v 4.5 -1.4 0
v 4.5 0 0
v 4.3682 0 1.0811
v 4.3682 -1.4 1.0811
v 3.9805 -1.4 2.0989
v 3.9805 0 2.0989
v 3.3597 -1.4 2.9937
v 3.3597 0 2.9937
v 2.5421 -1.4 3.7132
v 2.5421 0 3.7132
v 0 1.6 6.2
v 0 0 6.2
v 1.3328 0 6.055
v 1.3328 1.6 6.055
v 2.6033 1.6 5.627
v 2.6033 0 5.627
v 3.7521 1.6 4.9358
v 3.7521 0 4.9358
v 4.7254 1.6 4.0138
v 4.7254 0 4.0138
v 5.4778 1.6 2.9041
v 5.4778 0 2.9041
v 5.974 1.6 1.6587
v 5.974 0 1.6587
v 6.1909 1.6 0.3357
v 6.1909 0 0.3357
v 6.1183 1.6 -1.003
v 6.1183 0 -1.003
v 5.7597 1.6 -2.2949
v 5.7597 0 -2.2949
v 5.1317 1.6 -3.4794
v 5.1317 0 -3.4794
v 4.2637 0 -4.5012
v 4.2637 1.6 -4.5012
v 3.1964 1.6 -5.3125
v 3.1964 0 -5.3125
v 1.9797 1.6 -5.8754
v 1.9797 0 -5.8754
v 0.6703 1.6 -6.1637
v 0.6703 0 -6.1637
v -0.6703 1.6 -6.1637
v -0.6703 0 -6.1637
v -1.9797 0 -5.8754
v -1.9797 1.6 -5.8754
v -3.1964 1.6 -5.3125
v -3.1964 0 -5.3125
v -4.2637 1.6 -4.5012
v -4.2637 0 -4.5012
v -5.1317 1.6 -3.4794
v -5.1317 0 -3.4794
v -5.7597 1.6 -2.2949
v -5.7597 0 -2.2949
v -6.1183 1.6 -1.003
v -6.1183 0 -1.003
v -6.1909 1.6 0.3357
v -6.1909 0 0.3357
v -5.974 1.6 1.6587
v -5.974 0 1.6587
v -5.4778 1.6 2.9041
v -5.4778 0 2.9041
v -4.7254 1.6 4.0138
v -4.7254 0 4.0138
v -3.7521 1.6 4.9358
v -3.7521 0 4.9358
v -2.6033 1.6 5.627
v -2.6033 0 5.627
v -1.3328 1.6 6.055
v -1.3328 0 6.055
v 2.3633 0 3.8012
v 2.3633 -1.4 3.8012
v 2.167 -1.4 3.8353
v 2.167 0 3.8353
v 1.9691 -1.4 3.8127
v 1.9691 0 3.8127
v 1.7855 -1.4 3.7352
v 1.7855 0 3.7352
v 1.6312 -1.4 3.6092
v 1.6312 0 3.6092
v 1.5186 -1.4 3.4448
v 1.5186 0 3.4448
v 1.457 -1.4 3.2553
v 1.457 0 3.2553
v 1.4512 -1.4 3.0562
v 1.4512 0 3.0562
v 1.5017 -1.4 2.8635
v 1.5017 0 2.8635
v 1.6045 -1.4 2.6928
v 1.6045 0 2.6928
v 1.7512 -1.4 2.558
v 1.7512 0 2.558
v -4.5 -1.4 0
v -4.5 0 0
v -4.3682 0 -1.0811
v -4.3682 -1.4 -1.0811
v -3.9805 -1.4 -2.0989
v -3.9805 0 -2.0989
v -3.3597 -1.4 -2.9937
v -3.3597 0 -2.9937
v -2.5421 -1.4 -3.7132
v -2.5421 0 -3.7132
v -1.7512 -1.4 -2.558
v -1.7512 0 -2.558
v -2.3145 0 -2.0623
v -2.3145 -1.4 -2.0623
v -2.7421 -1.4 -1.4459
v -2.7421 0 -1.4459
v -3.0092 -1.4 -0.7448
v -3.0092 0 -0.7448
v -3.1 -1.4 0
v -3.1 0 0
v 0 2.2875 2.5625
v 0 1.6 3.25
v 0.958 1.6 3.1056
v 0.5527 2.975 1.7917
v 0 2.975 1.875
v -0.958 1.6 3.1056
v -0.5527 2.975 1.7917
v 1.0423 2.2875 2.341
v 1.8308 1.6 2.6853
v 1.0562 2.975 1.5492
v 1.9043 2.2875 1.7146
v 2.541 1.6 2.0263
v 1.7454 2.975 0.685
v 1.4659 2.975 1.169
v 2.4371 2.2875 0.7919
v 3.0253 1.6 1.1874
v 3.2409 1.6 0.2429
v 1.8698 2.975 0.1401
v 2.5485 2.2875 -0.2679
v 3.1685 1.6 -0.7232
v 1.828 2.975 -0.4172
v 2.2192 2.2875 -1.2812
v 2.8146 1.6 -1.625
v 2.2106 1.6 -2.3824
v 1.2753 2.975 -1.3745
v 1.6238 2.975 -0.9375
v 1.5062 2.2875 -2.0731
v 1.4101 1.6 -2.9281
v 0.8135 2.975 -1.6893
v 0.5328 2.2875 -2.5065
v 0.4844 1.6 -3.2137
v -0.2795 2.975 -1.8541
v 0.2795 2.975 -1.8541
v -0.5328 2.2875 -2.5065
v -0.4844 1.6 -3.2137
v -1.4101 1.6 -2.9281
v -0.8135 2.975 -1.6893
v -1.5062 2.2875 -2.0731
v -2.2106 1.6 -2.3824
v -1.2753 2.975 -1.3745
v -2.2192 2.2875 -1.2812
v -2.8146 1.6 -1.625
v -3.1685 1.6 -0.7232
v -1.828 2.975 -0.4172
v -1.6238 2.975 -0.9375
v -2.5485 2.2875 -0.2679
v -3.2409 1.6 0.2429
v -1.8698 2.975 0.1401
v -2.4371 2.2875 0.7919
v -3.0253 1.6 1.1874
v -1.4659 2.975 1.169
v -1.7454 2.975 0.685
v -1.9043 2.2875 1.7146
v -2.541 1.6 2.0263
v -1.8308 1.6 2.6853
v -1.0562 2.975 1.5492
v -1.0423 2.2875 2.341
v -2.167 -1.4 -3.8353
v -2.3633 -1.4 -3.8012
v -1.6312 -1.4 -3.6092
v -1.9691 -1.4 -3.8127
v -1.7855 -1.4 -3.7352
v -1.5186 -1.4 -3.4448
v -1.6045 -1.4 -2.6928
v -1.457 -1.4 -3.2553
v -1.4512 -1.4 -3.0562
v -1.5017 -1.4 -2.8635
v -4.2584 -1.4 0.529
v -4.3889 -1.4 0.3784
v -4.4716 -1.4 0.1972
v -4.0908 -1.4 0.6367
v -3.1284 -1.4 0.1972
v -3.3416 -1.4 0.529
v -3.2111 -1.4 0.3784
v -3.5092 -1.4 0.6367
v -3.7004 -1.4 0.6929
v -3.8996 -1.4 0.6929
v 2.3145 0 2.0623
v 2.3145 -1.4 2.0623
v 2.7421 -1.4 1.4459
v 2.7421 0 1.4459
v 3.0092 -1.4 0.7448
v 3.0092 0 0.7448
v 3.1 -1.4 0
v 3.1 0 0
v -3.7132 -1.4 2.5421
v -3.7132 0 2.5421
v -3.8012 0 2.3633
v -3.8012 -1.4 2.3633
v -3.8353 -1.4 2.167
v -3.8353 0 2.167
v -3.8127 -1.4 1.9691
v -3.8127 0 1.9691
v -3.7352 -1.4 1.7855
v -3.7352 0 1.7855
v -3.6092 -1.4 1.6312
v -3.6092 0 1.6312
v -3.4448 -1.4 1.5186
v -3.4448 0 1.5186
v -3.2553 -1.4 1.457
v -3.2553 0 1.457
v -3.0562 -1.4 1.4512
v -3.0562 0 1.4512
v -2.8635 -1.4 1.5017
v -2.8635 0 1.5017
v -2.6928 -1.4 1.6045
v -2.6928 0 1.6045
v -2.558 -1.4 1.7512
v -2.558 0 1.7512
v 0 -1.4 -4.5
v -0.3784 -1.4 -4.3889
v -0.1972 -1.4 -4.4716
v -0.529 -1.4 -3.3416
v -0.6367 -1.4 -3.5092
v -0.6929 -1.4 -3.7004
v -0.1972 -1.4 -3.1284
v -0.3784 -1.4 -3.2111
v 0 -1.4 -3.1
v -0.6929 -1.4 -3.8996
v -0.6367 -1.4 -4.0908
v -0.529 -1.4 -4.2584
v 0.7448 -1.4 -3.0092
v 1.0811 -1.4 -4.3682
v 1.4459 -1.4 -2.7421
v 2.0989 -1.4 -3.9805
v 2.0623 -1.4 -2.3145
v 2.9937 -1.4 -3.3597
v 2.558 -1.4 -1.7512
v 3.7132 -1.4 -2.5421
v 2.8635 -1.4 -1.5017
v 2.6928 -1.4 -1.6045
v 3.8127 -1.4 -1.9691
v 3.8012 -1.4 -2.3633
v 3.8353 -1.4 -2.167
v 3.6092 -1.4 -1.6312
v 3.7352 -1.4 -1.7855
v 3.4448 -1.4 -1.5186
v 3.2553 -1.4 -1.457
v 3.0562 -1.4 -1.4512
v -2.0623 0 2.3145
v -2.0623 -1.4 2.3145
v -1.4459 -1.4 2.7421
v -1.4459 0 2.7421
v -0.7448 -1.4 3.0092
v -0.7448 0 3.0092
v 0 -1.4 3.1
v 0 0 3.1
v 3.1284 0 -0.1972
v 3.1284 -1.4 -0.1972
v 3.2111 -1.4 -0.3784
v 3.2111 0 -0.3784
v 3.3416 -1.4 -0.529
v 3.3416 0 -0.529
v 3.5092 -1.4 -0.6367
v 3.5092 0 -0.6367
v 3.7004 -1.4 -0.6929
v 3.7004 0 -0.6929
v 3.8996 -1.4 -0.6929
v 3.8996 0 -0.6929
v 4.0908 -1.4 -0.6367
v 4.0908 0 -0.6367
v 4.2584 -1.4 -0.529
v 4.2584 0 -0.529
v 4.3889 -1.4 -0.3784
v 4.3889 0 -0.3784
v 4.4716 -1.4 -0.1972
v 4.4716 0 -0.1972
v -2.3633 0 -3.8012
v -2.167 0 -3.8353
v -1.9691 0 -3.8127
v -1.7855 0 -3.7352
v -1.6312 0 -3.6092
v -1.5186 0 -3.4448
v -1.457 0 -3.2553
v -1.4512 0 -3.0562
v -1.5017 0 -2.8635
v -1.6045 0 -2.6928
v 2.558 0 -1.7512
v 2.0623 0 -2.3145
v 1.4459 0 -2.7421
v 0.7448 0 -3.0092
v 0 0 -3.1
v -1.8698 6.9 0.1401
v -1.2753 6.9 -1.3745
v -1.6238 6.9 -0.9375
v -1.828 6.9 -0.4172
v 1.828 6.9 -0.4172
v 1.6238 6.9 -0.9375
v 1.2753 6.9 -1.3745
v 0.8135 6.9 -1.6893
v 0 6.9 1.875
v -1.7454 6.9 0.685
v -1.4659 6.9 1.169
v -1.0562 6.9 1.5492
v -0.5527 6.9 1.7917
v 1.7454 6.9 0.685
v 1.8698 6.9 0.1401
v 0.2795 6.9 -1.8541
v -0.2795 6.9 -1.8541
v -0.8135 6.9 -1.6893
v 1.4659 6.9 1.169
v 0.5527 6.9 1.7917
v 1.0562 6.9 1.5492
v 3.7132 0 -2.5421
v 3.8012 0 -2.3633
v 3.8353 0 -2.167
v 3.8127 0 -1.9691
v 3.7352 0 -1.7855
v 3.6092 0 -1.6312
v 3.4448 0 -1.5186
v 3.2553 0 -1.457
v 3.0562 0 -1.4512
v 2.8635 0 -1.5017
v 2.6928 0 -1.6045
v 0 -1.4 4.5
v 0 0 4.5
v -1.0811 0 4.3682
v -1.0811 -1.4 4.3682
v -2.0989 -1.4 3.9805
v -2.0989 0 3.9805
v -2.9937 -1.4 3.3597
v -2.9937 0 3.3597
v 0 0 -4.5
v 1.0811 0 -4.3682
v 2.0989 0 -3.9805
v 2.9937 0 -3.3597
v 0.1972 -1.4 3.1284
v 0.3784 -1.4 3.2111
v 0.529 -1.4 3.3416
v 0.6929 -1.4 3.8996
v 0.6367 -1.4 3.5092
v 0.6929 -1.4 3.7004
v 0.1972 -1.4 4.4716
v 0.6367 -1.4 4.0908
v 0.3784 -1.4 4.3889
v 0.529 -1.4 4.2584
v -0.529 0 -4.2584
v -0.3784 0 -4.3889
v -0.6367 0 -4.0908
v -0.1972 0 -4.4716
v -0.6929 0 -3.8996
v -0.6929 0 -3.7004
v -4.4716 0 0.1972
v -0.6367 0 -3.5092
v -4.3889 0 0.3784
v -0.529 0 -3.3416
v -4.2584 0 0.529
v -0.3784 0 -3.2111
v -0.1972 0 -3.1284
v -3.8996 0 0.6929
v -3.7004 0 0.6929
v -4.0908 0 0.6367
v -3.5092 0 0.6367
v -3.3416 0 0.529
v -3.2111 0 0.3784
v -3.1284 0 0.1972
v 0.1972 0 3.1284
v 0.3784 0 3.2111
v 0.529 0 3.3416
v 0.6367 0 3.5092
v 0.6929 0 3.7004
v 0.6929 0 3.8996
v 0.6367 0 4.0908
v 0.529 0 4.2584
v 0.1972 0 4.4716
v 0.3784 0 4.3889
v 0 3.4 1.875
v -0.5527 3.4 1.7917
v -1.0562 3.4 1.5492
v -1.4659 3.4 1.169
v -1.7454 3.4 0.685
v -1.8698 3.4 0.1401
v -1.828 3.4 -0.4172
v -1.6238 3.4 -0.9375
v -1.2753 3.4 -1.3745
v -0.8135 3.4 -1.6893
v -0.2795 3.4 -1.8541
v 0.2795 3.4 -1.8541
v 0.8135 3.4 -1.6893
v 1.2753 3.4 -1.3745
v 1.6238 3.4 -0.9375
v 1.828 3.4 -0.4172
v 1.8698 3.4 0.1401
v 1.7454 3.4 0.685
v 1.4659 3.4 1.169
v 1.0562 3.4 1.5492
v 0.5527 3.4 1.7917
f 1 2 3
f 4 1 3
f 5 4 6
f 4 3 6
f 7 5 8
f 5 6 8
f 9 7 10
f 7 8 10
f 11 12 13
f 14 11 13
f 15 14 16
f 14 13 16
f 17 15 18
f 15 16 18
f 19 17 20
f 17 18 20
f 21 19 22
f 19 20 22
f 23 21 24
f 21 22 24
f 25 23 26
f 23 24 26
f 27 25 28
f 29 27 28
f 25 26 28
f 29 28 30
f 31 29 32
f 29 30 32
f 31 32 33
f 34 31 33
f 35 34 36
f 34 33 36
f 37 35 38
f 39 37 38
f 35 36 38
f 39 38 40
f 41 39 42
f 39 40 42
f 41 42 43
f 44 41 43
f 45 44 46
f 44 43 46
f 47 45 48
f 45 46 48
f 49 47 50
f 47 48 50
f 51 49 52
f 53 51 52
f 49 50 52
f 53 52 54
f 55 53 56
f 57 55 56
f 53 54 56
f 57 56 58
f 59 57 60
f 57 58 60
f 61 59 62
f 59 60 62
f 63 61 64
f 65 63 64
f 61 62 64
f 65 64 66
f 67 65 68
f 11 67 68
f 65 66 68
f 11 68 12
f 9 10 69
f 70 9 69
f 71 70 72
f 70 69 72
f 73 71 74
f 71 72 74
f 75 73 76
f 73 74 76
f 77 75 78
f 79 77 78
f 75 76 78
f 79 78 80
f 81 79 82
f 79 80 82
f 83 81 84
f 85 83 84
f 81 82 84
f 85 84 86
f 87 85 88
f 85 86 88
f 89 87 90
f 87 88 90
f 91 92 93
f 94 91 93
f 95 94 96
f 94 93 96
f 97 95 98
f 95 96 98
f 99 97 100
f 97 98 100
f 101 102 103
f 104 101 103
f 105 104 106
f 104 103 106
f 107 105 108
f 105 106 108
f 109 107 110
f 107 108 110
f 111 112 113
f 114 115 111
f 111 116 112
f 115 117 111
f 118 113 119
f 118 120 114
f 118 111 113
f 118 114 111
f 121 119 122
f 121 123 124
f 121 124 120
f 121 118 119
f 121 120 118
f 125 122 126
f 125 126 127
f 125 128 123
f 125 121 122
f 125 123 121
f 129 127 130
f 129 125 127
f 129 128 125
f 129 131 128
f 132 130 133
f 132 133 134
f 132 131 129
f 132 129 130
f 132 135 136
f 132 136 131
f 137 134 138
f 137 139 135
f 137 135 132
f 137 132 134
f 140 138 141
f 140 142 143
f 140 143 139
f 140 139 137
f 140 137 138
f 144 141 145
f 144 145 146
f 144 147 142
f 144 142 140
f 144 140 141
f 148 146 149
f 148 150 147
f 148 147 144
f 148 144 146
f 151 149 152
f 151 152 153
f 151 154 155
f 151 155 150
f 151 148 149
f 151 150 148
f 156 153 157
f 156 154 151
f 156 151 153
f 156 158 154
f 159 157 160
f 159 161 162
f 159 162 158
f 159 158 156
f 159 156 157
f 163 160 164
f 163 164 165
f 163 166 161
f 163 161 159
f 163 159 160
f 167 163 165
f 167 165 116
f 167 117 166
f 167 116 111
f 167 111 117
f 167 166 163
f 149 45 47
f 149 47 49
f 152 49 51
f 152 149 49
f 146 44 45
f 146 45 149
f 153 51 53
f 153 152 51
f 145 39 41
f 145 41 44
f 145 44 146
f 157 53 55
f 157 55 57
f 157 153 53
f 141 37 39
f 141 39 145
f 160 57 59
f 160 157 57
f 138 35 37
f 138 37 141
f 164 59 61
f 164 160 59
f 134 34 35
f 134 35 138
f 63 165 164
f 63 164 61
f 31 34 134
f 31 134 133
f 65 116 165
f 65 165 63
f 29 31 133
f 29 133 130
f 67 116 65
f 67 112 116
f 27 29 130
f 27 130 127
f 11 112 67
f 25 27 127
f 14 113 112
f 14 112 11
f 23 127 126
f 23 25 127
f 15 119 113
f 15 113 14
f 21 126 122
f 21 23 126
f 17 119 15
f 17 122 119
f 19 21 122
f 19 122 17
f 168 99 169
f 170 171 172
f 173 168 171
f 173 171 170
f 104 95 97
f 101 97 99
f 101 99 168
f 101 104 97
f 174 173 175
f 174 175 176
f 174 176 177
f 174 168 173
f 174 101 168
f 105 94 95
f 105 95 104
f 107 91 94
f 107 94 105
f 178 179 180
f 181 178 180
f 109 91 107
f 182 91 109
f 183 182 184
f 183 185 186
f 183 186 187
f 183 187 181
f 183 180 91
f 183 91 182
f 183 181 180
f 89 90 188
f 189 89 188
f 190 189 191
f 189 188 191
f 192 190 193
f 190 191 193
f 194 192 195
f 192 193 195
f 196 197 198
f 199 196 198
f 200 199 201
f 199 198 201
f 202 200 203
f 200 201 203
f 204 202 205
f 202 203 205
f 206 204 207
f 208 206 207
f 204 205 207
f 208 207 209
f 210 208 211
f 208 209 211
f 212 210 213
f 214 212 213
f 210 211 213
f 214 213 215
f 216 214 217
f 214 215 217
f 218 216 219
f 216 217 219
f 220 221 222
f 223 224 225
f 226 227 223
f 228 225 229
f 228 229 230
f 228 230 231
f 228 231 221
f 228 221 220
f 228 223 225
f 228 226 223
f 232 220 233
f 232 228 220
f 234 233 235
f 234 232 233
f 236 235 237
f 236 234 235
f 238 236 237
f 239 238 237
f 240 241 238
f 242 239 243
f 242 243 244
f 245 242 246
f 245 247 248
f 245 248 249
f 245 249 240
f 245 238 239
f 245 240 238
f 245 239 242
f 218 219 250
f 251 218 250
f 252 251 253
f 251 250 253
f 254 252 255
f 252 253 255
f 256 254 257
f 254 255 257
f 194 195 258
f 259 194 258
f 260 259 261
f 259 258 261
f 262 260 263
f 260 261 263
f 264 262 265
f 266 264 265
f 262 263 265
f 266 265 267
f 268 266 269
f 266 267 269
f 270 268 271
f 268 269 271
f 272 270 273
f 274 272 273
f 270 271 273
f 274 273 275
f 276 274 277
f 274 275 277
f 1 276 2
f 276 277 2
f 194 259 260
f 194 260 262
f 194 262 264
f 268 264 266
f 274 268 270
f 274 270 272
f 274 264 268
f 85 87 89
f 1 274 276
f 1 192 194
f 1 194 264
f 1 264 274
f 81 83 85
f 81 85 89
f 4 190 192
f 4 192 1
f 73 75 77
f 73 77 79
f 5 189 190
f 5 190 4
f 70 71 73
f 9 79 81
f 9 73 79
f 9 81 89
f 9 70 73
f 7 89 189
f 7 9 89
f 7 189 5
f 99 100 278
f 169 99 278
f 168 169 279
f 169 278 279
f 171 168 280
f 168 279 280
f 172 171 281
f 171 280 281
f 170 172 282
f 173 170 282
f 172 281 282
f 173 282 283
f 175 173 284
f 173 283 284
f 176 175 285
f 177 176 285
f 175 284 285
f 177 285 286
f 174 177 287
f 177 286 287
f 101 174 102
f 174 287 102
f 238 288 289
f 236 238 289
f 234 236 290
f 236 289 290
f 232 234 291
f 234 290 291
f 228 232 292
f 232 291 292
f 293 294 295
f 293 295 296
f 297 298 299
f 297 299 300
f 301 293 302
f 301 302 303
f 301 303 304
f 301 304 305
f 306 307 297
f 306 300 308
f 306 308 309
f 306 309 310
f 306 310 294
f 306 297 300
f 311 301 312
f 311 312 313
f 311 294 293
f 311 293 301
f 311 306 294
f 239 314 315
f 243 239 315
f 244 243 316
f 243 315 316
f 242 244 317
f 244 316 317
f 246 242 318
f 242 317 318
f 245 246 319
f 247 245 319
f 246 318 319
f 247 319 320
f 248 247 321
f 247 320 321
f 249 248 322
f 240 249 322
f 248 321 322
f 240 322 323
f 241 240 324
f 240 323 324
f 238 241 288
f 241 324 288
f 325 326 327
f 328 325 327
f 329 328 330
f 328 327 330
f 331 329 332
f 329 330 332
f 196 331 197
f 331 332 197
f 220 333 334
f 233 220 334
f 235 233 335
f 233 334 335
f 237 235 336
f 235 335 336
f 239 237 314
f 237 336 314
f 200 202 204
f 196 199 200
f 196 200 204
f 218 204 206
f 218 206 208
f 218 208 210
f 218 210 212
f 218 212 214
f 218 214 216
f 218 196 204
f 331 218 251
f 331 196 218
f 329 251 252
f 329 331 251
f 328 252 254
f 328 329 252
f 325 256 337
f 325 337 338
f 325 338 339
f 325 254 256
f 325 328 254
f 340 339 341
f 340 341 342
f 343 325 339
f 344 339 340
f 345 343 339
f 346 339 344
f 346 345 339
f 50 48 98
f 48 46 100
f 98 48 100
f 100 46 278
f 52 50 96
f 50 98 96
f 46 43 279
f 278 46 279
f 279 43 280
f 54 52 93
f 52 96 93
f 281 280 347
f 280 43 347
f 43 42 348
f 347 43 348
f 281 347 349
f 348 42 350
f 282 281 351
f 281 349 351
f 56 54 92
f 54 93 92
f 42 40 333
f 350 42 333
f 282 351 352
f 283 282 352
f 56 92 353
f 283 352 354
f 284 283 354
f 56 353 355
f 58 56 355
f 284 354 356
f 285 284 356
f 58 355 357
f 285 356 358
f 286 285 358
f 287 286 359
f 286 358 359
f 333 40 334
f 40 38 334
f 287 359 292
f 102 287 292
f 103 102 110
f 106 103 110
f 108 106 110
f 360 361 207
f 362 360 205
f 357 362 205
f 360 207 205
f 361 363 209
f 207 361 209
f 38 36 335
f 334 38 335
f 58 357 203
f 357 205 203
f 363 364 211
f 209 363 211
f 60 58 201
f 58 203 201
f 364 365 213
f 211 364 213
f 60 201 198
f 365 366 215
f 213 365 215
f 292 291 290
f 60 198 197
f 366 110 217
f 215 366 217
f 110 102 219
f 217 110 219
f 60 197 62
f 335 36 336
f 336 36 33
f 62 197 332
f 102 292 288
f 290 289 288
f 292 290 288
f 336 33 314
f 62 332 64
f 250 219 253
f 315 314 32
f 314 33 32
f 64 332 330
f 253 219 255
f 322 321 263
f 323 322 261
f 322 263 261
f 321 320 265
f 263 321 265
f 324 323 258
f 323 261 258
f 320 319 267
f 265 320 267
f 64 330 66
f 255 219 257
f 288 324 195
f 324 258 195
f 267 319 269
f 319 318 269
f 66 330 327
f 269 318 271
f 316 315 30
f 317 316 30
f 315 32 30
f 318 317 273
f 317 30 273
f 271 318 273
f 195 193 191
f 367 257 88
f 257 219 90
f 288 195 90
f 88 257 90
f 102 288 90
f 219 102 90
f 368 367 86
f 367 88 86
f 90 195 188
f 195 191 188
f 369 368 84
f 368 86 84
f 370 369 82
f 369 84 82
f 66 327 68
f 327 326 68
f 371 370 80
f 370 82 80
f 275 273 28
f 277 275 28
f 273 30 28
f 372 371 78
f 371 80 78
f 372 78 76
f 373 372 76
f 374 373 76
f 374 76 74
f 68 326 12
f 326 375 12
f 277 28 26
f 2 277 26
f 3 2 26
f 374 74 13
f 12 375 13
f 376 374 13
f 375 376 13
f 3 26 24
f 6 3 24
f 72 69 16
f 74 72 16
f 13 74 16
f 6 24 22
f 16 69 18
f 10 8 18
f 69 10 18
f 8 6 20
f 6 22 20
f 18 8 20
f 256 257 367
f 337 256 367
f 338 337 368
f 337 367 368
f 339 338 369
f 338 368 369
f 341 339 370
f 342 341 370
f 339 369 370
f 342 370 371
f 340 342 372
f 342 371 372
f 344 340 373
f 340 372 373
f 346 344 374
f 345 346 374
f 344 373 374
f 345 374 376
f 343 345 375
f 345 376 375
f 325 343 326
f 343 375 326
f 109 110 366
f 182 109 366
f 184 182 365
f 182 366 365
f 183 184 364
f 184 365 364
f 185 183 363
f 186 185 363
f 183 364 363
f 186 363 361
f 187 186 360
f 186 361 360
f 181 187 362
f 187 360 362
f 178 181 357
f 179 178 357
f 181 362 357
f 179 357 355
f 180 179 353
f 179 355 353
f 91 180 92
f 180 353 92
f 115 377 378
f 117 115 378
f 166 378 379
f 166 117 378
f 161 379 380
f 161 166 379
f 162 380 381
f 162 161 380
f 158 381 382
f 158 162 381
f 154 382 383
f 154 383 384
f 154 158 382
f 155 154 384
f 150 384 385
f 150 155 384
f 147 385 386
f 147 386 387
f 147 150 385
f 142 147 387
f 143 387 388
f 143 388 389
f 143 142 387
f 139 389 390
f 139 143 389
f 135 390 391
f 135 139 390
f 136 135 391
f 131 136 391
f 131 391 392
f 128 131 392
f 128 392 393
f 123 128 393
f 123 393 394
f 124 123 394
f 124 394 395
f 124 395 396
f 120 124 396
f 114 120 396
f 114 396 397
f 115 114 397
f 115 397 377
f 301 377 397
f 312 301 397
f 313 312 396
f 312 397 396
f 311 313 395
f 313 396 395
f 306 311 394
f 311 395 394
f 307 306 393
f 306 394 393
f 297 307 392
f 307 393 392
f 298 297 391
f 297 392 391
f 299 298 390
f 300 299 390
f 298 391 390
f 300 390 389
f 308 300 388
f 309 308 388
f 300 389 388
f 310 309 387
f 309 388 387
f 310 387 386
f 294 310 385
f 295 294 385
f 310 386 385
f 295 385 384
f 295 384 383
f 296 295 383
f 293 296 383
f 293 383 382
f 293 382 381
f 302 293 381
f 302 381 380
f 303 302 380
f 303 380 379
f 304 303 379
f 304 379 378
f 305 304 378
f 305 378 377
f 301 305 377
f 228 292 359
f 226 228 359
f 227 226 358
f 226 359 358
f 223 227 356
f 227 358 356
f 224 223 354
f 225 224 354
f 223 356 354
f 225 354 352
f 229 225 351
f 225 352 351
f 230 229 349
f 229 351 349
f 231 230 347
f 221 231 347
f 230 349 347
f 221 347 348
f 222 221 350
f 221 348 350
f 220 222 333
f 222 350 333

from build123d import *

# Parameters (mm, degrees)
ESQUISSE1_R        = 6.2
BOSS_EXTRU_1_DEPTH = 1.6
ESQUISSE2_R        = 1.875
BOSS_EXTRU_3_DEPTH = 5.3
ESQUISSE3_R        = 3.25
BOSS_EXTRU_5_DEPTH = 1.8
CHANFREIN2_SIZE    = 1.8
BOSS_EXTRU_6_DEPTH = 1.4


with BuildPart() as part:
    # Esquisse1 → Boss.-Extru.1 (new body)
    with BuildSketch(Plane(origin=(0, 0, 0), x_dir=(1, 0, 0), z_dir=(0, 1, 0))):
        with Locations(Location((0, 0, 0), (0, 0, 270))):
            Circle(ESQUISSE1_R)
    extrude(amount=BOSS_EXTRU_1_DEPTH)

    # Esquisse2 → Boss.-Extru.3 (add)
    with BuildSketch(Plane(origin=(0, 1.6, 0), x_dir=(1, 0, 0), z_dir=(0, 1, 0))):
        with Locations(Location((0, 0, 0), (0, 0, 270))):
            Circle(ESQUISSE2_R)
    extrude(amount=BOSS_EXTRU_3_DEPTH)

    # Esquisse3 → Boss.-Extru.5 (add)
    with BuildSketch(Plane(origin=(0, 1.6, 0), x_dir=(1, 0, 0), z_dir=(0, 1, 0))):
        with Locations(Location((0, 0, 0), (0, 0, 270))):
            Circle(ESQUISSE3_R)
    extrude(amount=BOSS_EXTRU_5_DEPTH)

    # Chanfrein2
    # the kernel refuses this chamfer: 1.8 mm, written as the material it takes off along each edge
    with BuildSketch(Plane(origin=(0, 3.4, 0), x_dir=(0, 0, 1), z_dir=(-1, 0, 0))) as chanfrein2_piece_1_section:
        Polygon((3.25, -CHANFREIN2_SIZE), (3.25 - CHANFREIN2_SIZE, 0), (3.25, 0), align=None)
    chanfrein2_piece_1 = revolve(axis=Axis((0, 3.4, 0), (0, 1, 0)), mode=Mode.PRIVATE)
    chanfrein2_piece_1 = split(chanfrein2_piece_1, bisect_by=Plane(origin=(0, 1.6, -2.584069467), z_dir=(0, 1, 0)), keep=Keep.TOP, mode=Mode.PRIVATE)
    chanfrein2_piece_1 = chanfrein2_piece_1 - Plane(origin=(0, 2.309069467, 0), x_dir=(0, 0, 1), z_dir=(0, -1, 0)) * Cylinder(1.875, 13, mode=Mode.PRIVATE)
    add(chanfrein2_piece_1, mode=Mode.SUBTRACT)

    # Esquisse4 → Boss.-Extru.6 (add)
    with BuildSketch(Plane.XZ):
        with BuildLine():
            ThreePointArc((0, -4.5), (2.098884425, -3.980538176), (3.71319537, -2.542081853))
            ThreePointArc((3.71319537, -2.542081853), (3.531022156, -1.569038729), (2.557979032, -1.751211943))
            ThreePointArc((2.557979032, -1.751211943), (1.44589816, -2.742148521), (0, -3.1))
            ThreePointArc((0, -3.1), (-0.7, -3.8), (0, -4.5))
        make_face()
        with BuildLine():
            ThreePointArc((3.1, 0), (3.8, -0.7), (4.5, 0))
            ThreePointArc((4.5, 0), (3.980538176, 2.098884425), (2.542081853, 3.71319537))
            ThreePointArc((2.542081853, 3.71319537), (1.569038729, 3.531022156), (1.751211943, 2.557979032))
            ThreePointArc((1.751211943, 2.557979032), (2.742148521, 1.44589816), (3.1, 0))
        make_face()
        with BuildLine():
            ThreePointArc((-4.5, 0), (-3.980538176, -2.098884425), (-2.542081853, -3.71319537))
            ThreePointArc((-2.542081853, -3.71319537), (-1.569038729, -3.531022156), (-1.751211943, -2.557979032))
            ThreePointArc((-1.751211943, -2.557979032), (-2.742148521, -1.44589816), (-3.1, 0))
            ThreePointArc((-3.1, 0), (-3.8, 0.7), (-4.5, 0))
        make_face()
        with BuildLine():
            ThreePointArc((0, 3.1), (0.7, 3.8), (0, 4.5))
            ThreePointArc((0, 4.5), (-2.098884425, 3.980538176), (-3.71319537, 2.542081853))
            ThreePointArc((-3.71319537, 2.542081853), (-3.531022156, 1.569038729), (-2.557979032, 1.751211943))
            ThreePointArc((-2.557979032, 1.751211943), (-1.44589816, 2.742148521), (0, 3.1))
        make_face()
    extrude(amount=BOSS_EXTRU_6_DEPTH)


solid = part.part
